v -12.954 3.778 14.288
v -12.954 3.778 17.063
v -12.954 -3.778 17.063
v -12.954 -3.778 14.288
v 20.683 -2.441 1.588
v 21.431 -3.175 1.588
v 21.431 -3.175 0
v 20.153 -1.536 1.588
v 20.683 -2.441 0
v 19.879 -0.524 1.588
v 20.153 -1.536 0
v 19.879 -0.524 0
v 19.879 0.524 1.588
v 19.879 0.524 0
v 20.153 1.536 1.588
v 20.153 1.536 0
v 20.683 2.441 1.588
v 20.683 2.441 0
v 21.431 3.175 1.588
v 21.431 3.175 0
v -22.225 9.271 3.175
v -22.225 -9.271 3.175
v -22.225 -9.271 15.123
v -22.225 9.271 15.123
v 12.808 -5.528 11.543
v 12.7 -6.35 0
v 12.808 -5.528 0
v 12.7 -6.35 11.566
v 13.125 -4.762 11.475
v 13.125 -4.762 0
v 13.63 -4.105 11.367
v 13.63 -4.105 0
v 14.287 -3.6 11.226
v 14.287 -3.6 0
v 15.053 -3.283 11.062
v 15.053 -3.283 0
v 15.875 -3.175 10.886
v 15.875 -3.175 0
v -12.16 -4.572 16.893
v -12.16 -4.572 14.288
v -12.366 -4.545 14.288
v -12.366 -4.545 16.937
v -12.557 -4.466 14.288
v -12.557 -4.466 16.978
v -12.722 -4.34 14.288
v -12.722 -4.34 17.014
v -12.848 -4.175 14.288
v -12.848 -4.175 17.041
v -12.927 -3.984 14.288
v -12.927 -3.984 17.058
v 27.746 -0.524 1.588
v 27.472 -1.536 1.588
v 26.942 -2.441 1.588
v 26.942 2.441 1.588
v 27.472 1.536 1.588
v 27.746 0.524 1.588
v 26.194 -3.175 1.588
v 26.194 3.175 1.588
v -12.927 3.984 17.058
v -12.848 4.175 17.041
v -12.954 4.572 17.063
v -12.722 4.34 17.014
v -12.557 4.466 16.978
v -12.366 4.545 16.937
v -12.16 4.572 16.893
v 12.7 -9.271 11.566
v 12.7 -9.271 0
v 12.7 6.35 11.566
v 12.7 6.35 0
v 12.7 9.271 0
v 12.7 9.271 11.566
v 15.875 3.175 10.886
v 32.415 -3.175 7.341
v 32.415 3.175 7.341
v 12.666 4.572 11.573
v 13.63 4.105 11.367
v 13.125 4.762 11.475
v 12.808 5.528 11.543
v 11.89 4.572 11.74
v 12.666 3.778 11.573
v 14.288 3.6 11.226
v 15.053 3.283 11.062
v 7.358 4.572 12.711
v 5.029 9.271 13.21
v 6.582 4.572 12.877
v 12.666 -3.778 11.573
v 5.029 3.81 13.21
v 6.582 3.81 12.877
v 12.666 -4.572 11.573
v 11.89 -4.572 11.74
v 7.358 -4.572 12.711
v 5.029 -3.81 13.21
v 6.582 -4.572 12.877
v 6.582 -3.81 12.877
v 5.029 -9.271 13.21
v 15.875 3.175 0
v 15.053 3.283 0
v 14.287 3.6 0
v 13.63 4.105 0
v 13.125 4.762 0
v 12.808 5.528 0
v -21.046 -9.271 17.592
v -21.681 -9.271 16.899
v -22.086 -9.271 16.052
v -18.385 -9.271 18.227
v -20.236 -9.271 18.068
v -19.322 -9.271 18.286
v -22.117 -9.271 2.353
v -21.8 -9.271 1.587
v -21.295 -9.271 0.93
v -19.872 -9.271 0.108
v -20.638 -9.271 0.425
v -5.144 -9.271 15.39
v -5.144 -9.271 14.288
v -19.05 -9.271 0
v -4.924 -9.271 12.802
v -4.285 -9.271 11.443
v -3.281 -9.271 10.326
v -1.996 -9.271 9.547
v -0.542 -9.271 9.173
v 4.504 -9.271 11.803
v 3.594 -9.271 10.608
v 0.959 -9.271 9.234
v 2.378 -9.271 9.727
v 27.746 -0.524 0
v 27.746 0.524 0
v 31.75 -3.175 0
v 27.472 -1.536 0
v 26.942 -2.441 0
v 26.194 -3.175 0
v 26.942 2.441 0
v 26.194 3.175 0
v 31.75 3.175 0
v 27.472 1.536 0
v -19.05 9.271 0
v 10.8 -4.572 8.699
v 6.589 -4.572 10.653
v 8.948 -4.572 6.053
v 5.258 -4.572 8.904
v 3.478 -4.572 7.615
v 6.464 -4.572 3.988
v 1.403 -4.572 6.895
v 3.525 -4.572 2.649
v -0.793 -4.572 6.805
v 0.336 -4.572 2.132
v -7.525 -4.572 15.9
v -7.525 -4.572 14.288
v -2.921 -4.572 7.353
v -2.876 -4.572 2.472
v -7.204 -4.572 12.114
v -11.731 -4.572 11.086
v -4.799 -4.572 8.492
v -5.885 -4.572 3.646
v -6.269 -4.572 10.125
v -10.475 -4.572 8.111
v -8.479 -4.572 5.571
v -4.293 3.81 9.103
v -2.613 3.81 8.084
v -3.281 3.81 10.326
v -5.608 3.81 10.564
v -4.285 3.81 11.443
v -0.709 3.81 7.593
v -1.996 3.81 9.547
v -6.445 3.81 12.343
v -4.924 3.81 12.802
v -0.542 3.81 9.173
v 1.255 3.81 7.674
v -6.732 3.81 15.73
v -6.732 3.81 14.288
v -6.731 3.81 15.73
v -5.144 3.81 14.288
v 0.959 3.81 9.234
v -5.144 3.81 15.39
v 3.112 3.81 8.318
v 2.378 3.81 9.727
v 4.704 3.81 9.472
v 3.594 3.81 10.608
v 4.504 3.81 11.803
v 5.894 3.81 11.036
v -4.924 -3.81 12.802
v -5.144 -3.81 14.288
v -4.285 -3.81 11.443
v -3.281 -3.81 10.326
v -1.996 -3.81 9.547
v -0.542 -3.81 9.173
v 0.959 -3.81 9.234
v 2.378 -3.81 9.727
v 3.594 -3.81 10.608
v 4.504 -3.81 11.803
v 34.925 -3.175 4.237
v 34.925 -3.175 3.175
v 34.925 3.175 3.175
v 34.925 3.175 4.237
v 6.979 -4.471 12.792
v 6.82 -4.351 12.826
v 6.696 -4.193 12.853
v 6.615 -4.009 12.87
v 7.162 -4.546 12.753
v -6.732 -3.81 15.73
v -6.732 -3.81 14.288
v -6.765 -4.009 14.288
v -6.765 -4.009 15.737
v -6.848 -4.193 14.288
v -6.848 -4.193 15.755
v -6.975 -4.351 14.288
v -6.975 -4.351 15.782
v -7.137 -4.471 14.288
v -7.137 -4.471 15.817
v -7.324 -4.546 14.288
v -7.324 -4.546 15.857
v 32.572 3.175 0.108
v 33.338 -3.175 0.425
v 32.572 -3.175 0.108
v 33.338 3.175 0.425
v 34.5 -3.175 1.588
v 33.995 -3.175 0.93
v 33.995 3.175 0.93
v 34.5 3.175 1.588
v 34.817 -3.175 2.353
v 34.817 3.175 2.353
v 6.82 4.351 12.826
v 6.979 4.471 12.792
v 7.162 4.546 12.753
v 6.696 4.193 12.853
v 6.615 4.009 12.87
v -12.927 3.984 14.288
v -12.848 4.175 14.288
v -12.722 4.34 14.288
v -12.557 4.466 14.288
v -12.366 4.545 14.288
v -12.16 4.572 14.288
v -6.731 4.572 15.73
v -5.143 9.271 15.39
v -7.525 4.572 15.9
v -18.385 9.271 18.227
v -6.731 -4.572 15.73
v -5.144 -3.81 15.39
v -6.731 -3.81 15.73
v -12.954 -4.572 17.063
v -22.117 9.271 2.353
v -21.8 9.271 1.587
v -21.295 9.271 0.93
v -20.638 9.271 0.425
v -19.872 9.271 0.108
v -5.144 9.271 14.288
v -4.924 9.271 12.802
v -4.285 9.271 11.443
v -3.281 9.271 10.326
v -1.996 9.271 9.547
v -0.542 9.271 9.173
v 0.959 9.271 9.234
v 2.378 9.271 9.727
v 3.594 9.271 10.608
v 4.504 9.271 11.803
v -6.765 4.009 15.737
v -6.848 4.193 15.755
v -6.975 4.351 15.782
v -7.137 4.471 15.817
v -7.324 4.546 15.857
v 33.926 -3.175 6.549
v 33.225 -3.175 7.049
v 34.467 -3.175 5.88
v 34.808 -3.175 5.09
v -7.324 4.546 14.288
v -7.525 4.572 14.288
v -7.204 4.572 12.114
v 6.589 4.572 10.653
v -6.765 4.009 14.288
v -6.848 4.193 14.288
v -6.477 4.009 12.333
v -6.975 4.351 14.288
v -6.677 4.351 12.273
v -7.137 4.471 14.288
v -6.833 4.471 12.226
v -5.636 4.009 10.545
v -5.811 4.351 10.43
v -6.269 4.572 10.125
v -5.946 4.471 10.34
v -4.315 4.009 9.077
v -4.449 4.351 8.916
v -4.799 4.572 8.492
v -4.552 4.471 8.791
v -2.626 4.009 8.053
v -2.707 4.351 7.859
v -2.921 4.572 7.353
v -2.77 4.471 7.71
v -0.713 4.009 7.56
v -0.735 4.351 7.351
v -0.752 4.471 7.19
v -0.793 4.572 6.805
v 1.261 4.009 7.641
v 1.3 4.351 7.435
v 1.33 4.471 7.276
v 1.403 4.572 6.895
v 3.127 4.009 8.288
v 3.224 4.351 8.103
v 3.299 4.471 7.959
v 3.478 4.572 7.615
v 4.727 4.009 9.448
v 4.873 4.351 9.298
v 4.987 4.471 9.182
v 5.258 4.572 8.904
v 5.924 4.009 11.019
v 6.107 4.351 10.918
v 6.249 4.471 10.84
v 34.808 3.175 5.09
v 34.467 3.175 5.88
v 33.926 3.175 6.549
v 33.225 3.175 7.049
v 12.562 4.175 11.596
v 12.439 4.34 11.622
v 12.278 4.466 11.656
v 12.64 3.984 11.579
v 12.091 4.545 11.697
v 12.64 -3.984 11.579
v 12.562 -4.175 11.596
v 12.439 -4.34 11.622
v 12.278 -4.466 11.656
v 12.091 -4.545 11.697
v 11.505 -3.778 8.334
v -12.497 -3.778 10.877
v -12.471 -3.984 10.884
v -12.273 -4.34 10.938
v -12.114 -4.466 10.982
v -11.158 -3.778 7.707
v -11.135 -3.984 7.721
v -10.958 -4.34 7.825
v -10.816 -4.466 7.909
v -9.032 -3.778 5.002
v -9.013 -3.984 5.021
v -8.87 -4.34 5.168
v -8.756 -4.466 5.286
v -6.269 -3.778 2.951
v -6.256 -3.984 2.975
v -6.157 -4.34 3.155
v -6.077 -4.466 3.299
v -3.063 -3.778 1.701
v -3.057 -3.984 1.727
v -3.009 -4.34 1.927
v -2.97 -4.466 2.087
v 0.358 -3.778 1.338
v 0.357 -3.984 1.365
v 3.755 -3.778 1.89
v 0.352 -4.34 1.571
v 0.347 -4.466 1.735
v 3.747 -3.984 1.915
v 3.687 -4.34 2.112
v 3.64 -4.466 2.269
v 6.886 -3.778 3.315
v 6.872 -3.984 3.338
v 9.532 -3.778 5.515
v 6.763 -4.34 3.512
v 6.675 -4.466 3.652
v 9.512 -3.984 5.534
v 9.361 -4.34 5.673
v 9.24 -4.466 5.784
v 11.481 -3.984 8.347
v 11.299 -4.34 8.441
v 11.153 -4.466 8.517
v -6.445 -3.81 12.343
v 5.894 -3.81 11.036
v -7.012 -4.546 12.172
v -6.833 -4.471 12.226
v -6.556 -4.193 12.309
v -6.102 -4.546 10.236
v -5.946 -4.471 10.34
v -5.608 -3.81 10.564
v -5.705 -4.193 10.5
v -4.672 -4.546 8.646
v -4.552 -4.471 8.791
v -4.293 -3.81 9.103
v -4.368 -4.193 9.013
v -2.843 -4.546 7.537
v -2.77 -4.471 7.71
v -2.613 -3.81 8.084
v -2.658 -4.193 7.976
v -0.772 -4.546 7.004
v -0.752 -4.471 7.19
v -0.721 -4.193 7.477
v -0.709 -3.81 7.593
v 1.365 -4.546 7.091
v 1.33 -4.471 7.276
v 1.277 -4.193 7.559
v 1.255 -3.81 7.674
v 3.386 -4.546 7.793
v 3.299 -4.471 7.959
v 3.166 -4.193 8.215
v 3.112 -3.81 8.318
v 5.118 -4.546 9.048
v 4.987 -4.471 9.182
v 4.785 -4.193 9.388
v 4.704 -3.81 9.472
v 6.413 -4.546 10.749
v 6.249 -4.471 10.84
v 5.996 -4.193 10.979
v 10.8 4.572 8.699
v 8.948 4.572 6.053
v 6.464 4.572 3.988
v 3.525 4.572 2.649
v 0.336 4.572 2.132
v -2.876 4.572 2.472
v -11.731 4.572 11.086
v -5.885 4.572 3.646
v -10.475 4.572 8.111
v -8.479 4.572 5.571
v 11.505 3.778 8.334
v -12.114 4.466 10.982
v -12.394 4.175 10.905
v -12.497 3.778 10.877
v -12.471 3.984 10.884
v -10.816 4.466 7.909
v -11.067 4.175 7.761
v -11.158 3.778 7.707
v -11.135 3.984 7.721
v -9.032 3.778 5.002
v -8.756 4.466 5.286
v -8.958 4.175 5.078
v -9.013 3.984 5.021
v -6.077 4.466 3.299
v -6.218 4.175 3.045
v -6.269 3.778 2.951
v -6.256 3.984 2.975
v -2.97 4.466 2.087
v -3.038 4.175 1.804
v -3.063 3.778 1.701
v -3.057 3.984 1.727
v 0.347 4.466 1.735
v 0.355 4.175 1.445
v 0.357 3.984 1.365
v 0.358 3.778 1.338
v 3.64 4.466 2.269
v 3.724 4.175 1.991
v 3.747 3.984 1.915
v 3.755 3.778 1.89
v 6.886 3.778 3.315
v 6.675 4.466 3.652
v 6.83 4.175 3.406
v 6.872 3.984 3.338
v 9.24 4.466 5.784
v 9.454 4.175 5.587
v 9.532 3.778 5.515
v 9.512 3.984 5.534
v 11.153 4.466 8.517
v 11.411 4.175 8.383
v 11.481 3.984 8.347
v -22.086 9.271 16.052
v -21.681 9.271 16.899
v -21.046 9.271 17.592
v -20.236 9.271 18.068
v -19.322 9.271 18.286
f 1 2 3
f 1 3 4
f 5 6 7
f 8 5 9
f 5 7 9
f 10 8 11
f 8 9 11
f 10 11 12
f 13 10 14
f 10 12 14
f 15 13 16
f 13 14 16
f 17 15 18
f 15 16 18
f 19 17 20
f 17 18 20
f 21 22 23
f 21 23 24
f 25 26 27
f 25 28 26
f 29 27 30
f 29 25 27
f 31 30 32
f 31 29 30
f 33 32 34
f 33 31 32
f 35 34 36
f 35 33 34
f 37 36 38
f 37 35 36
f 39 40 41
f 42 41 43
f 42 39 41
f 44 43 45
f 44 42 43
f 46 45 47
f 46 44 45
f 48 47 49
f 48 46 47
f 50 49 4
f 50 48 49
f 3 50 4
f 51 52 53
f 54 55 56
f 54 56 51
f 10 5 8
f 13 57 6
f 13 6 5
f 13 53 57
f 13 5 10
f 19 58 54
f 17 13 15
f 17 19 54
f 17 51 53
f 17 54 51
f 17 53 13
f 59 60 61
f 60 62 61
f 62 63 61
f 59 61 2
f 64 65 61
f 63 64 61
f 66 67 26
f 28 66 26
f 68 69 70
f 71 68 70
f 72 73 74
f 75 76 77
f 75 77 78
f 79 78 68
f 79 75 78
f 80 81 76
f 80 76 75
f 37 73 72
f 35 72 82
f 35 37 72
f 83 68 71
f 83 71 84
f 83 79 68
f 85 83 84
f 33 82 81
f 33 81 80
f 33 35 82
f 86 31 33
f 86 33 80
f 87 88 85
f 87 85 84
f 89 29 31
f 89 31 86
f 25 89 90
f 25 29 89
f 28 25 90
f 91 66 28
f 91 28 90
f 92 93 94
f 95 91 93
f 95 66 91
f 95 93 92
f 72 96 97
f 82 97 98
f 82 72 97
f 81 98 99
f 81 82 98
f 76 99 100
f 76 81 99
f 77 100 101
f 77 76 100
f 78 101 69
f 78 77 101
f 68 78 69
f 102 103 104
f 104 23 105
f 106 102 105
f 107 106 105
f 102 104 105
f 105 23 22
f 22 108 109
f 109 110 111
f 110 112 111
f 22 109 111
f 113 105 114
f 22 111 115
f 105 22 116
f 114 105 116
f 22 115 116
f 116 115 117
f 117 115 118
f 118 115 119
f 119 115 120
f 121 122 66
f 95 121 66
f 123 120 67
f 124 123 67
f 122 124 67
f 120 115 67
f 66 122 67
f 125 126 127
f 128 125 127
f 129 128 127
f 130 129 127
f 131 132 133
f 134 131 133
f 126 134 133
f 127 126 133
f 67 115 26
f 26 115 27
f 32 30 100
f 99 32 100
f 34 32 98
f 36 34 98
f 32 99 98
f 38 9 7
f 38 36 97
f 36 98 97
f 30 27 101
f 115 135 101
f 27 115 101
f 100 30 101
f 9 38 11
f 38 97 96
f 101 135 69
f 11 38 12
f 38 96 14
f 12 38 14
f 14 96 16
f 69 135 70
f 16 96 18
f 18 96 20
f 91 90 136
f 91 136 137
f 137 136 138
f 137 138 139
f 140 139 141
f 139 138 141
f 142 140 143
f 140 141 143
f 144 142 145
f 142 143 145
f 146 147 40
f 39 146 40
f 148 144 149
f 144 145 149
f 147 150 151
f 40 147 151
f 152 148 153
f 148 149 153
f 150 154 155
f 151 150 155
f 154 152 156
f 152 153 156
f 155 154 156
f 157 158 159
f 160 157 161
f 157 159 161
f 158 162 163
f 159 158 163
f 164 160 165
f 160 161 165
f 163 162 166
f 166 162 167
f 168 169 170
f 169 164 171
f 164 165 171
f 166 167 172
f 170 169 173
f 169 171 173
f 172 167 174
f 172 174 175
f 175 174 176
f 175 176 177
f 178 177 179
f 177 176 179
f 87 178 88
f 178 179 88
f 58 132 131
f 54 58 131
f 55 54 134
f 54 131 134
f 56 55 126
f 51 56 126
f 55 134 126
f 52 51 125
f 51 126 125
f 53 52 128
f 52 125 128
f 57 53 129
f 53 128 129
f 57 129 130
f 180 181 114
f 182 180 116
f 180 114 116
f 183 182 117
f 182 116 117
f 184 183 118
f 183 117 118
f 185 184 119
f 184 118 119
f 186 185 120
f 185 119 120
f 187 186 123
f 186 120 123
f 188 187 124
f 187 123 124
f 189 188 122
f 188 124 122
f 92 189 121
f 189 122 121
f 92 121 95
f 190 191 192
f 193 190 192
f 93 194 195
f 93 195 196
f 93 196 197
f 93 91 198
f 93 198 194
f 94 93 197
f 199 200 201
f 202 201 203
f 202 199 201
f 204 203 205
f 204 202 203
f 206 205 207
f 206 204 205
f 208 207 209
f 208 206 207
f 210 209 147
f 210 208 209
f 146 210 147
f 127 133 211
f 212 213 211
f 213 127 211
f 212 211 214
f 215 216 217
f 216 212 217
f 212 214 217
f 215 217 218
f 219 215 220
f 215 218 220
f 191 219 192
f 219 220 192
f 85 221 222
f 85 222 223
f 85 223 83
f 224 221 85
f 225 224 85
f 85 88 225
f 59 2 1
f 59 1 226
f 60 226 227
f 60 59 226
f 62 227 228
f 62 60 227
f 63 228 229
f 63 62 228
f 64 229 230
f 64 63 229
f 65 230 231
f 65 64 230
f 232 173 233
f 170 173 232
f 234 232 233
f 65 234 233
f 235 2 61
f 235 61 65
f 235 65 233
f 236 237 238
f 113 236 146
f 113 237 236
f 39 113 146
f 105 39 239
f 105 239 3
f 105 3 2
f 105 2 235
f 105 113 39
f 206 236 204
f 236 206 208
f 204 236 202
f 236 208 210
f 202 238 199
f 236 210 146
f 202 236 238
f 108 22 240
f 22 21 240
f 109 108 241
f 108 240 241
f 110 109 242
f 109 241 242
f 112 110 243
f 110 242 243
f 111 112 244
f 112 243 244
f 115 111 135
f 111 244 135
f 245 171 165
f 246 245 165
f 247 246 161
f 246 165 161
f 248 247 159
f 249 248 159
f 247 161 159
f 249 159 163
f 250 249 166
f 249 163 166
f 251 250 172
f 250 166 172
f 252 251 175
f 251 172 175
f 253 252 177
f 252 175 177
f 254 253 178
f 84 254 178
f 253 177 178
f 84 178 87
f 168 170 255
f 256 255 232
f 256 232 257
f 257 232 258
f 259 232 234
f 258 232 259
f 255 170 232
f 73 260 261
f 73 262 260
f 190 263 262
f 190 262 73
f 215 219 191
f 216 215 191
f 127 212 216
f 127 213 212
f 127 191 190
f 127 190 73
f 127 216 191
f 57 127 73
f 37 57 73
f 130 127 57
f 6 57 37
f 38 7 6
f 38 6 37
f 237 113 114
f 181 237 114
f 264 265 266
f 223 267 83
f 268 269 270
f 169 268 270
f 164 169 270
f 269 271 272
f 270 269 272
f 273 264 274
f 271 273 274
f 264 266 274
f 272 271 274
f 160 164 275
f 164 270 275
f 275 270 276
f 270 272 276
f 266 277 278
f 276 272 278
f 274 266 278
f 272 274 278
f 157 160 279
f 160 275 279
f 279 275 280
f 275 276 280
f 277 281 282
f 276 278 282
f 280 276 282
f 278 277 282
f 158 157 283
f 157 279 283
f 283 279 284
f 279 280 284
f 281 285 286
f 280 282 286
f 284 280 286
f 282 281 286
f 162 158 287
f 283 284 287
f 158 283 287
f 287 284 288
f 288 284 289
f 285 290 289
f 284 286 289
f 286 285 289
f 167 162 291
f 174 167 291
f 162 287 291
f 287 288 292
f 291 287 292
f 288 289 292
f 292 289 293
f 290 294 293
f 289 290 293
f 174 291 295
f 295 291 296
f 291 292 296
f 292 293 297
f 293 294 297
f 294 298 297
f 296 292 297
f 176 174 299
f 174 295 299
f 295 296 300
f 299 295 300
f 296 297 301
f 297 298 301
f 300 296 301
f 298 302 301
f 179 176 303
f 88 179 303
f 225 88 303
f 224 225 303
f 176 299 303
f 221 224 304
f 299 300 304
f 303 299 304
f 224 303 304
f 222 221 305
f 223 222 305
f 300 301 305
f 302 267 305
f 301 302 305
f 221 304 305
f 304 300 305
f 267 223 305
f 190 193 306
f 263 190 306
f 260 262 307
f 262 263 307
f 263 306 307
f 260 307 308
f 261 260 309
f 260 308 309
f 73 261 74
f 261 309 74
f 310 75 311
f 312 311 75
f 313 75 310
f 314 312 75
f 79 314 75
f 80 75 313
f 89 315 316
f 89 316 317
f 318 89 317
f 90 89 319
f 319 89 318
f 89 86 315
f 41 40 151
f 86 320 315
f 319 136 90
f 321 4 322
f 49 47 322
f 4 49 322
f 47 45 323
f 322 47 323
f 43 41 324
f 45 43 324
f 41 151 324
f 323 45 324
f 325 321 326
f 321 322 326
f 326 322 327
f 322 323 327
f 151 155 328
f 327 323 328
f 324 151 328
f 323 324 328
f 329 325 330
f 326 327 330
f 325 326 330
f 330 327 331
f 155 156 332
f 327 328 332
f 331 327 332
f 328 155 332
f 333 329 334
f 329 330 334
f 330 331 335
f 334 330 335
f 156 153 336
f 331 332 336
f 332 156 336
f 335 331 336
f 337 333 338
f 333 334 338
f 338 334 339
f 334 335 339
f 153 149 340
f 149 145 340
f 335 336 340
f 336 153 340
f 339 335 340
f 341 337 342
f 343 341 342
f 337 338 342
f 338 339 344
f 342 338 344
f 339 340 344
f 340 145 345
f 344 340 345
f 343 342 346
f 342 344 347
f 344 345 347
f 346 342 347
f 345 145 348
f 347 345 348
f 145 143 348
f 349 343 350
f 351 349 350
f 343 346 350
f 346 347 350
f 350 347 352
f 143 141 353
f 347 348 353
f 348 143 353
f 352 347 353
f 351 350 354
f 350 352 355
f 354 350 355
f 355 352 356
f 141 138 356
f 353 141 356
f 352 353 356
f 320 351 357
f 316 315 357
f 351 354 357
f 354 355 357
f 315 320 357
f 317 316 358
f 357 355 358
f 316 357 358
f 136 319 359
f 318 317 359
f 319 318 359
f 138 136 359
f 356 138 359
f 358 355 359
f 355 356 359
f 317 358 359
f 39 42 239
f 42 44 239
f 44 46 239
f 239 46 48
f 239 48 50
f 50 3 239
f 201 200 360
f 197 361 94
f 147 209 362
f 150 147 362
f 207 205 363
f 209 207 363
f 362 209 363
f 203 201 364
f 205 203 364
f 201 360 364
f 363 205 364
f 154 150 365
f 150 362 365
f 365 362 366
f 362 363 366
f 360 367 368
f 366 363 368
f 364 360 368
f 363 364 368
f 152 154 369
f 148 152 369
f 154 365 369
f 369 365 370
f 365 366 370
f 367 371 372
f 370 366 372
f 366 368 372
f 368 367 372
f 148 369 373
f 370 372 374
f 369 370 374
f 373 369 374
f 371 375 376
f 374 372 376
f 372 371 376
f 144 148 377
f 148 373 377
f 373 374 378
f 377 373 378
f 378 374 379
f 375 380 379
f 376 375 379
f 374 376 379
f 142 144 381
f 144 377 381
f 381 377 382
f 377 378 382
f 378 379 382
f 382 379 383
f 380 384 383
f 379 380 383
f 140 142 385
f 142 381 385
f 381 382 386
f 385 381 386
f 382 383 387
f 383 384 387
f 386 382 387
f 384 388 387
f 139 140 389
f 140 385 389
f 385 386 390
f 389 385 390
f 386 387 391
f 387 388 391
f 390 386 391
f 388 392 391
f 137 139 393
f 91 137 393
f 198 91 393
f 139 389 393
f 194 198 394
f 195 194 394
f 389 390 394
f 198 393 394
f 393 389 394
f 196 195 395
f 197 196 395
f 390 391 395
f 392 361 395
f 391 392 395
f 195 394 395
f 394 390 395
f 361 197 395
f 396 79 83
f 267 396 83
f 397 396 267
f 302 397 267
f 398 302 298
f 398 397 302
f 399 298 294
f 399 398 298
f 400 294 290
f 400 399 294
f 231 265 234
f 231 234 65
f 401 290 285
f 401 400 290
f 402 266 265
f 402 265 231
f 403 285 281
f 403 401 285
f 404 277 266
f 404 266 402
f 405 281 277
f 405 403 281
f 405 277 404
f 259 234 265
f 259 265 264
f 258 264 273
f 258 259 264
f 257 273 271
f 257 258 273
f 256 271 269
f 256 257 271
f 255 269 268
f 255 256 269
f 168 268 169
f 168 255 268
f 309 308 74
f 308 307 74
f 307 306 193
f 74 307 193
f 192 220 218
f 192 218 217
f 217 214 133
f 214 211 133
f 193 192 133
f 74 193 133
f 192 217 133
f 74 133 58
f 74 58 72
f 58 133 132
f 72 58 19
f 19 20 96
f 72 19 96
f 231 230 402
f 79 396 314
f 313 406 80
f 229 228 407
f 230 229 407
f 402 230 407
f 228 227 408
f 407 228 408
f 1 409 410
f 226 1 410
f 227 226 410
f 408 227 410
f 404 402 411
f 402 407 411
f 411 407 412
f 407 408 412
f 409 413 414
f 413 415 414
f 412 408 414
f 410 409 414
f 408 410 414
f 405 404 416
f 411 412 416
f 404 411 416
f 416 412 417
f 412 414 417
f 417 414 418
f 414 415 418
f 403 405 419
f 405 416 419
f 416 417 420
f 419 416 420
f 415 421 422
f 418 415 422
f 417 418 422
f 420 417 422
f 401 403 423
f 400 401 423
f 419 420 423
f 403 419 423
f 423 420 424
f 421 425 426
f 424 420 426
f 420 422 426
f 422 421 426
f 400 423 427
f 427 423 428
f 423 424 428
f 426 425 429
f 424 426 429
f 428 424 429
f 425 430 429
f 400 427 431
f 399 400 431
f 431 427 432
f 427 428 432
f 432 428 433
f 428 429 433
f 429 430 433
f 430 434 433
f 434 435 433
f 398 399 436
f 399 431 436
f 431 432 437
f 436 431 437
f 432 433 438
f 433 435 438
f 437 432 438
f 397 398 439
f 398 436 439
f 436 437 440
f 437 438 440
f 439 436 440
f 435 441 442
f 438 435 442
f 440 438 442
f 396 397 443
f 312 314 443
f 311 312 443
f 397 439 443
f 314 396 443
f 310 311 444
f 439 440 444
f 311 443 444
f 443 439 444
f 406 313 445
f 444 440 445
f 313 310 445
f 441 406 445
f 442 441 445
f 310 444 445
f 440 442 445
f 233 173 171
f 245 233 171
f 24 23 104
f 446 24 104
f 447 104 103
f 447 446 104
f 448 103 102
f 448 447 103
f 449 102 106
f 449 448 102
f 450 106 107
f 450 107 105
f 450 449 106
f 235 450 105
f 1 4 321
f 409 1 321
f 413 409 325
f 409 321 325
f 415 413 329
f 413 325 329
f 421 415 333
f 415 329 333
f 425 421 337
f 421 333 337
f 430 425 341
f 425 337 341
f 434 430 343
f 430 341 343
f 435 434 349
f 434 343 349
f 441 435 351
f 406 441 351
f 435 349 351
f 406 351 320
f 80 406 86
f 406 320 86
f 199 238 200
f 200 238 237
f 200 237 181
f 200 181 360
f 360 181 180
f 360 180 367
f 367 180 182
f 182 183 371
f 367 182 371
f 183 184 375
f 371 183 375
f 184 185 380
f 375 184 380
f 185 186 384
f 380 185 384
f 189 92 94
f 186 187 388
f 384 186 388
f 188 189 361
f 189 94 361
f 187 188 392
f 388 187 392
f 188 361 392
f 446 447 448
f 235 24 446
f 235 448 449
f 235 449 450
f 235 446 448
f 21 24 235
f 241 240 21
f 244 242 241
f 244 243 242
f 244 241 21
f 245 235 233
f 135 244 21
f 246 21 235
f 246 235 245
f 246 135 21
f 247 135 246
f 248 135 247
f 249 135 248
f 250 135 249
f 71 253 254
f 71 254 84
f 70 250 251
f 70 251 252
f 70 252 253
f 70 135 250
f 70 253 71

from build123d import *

# Parameters (mm, degrees)
SKETCH1_W               = 57.15
SKETCH1_H               = 18.542
BOSS_EXTRUDE1_DEPTH     = 19.05
CUT_EXTRUDE1_DEPTH      = 41.848617676
CUT_EXTRUDE1_DEPTH_BACK = 41.848617676
CUT_EXTRUDE2_DEPTH      = 4.572
CUT_EXTRUDE2_DEPTH_BACK = 4.572
CUT_EXTRUDE3_DEPTH      = 3.81
CUT_EXTRUDE3_DEPTH_BACK = 3.81
CUT_EXTRUDE5_DEPTH      = 44.89150133
FILLET1_R               = 3.175
SKETCH9_R               = 3.96875
CUT_EXTRUDE6_DEPTH      = 1.5875
SKETCH10_W              = 22.225
SKETCH10_H              = 6.096
CUT_EXTRUDE7_DEPTH      = 41.503184716
FILLET2_R               = 3.175
FILLET3_R               = 0.79375


with BuildPart() as part:
    # Sketch1 → Boss-Extrude1 (new body)
    with BuildSketch(Plane.XY):
        with Locations((6.35, 0)):
            Rectangle(SKETCH1_W, SKETCH1_H)
    extrude(amount=BOSS_EXTRUDE1_DEPTH)

    # Sketch3 → Cut-Extrude1 (cut, two sides: drawn at the far end of the back side and taken through both)
    with BuildSketch(Plane(origin=(0, 0, 0), x_dir=(1, 0, 0), z_dir=(0, 1, 0)).offset(-CUT_EXTRUDE1_DEPTH_BACK)):
        with BuildLine():
            Line((-5.1435, -19.05), (-5.1435, -14.2875))
            ThreePointArc((-5.1435, -14.2875), (0, -9.144), (5.1435, -14.2875))
            Line((5.1435, -14.2875), (5.1435, -19.05))
            ThreePointArc((5.1435, -19.05), (0, -24.1935), (-5.1435, -19.05))
        make_face()
    extrude(amount=CUT_EXTRUDE1_DEPTH + CUT_EXTRUDE1_DEPTH_BACK, mode=Mode.SUBTRACT)

    # Sketch5 → Cut-Extrude2 (cut, two sides: drawn at the far end of the back side and taken through both)
    with BuildSketch(Plane(origin=(0, 0, 0), x_dir=(1, 0, 0), z_dir=(0, 1, 0)).offset(-CUT_EXTRUDE2_DEPTH_BACK)):
        with BuildLine():
            Line((12.954, -14.2875), (12.954, -19.05))
            ThreePointArc((12.954, -19.05), (0, -32.004), (-12.954, -19.05))
            Line((-12.954, -19.05), (-12.954, -14.2875))
            ThreePointArc((-12.954, -14.2875), (0, -1.3335), (12.954, -14.2875))
        make_face()
        with BuildLine():
            Line((-6.731, -19.05), (-6.731, -14.2875))
            ThreePointArc((-6.731, -14.2875), (0, -7.5565), (6.731, -14.2875))
            Line((6.731, -14.2875), (6.731, -19.05))
            ThreePointArc((6.731, -19.05), (0, -25.781), (-6.731, -19.05))
        make_face(mode=Mode.SUBTRACT)
    extrude(amount=CUT_EXTRUDE2_DEPTH + CUT_EXTRUDE2_DEPTH_BACK, mode=Mode.SUBTRACT)

    # Sketch6 → Cut-Extrude3 (cut, two sides: drawn at the far end of the back side and taken through both)
    with BuildSketch(Plane(origin=(0, 0, 0), x_dir=(1, 0, 0), z_dir=(0, 1, 0)).offset(-CUT_EXTRUDE3_DEPTH_BACK)):
        with BuildLine():
            Line((-8.3185, -19.05), (-8.3185, -14.2875))
            ThreePointArc((-8.3185, -14.2875), (0, -5.969), (8.3185, -14.2875))
            Line((8.3185, -14.2875), (8.3185, -19.05))
            ThreePointArc((8.3185, -19.05), (0, -27.3685), (-8.3185, -19.05))
        make_face()
    extrude(amount=CUT_EXTRUDE3_DEPTH + CUT_EXTRUDE3_DEPTH_BACK, mode=Mode.SUBTRACT)

    # Sketch8 → Cut-Extrude5 (cut, through all)
    with BuildSketch(Plane.XZ.offset(9.271)):
        Polygon((-22.225, 19.05), (34.925, 19.05), (34.925, 6.803571429), align=None)
    extrude(amount=-CUT_EXTRUDE5_DEPTH, mode=Mode.SUBTRACT)

    # Fillet1
    fillet1_edges = [part.edges().sort_by_distance(p)[0] for p in [
        (-22.225, 0, 19.05),
        (34.925, 0, 6.803571429),
        (-22.225, 0, 0),
        (34.925, 0, 0),
    ]]
    fillet(fillet1_edges, radius=FILLET1_R)

    # Sketch9 → Cut-Extrude6 (cut)
    with BuildSketch(Plane(origin=(0, 0, 0), x_dir=(-1, 0, 0), z_dir=(0, 0, -1))):
        with Locations((-23.8125, 0)):
            Circle(SKETCH9_R)
    extrude(amount=-CUT_EXTRUDE6_DEPTH, mode=Mode.SUBTRACT)

    # Sketch10 → Cut-Extrude7 (cut, through all)
    with BuildSketch(Plane(origin=(0, 0, 0), x_dir=(-1, 0, 0), z_dir=(0, 0, -1))):
        with Locations((-23.8125, 6.223)):
            Rectangle(SKETCH10_W, SKETCH10_H)
        with Locations((-23.8125, -6.223)):
            Rectangle(SKETCH10_W, SKETCH10_H)
    extrude(amount=-CUT_EXTRUDE7_DEPTH, mode=Mode.SUBTRACT)

    # Fillet2
    fillet2_edges = [part.edges().sort_by_distance(p)[0] for p in [
        (12.7, 3.175, 5.783035714),
        (12.7, -3.175, 5.783035714),
    ]]
    fillet(fillet2_edges, radius=FILLET2_R)

    # Fillet3
    # the kernel refuses this fillet: 0.79375 mm, written as the material it adds along each edge
    with BuildSketch(Plane(origin=(-6.731, 4.572, 17.714232143), x_dir=(-1, 0, 0), z_dir=(0, 0, -1))) as fillet3_piece_1_section:
        with BuildLine():
            CenterArc((FILLET3_R, -FILLET3_R), FILLET3_R, 90, 90)
            Line((0, -FILLET3_R), (0, 0))
            Line((0, 0), (FILLET3_R, 0))
        make_face()
    fillet3_piece_1 = extrude(amount=3.426732143, mode=Mode.PRIVATE)
    fillet3_piece_1 = split(fillet3_piece_1, bisect_by=Plane(origin=(-6.763728877, 4.396665284, 15.736870474), z_dir=(-0.2095290887308735, 0, -0.9778024140774095)), keep=Keep.TOP, mode=Mode.PRIVATE)
    fillet3_piece_1 = split(fillet3_piece_1, bisect_by=Plane(origin=(-6.915533266, 3.81, 15.028449993), z_dir=(0, 1, 0)), keep=Keep.TOP, mode=Mode.PRIVATE)
    add(fillet3_piece_1)
    with BuildSketch(Plane(origin=(-6.731, -4.572, 17.714232143), x_dir=(-1, 0, 0), z_dir=(0, 0, -1))) as fillet3_piece_2_section:
        with BuildLine():
            CenterArc((FILLET3_R, FILLET3_R), FILLET3_R, 180, 90)
            Line((0, FILLET3_R), (0, 0))
            Line((0, 0), (FILLET3_R, 0))
        make_face()
    fillet3_piece_2 = extrude(amount=3.426732143, mode=Mode.PRIVATE)
    fillet3_piece_2 = split(fillet3_piece_2, bisect_by=Plane(origin=(-6.763728877, -4.396665284, 15.736870474), z_dir=(-0.2095290887308735, 0, -0.9778024140774095)), keep=Keep.TOP, mode=Mode.PRIVATE)
    fillet3_piece_2 = split(fillet3_piece_2, bisect_by=Plane(origin=(-6.915533266, -3.81, 15.028449993), z_dir=(0, -1, 0)), keep=Keep.TOP, mode=Mode.PRIVATE)
    add(fillet3_piece_2)
    with BuildSketch(Plane(origin=(-12.954, -4.572, 19.047732143), x_dir=(1, 0, 0), z_dir=(0, 0, -1))) as fillet3_piece_3_section:
        with BuildLine():
            CenterArc((FILLET3_R, -FILLET3_R), FILLET3_R, 90, 90)
            Line((0, -FILLET3_R), (0, 0))
            Line((0, 0), (FILLET3_R, 0))
        make_face()
    fillet3_piece_3 = extrude(amount=4.760232143, mode=Mode.PRIVATE)
    fillet3_piece_3 = split(fillet3_piece_3, bisect_by=Plane(origin=(-12.496129388, -4.39094469, 16.965242012), z_dir=(-0.2095290887308735, 0, -0.9778024140774095)), keep=Keep.TOP, mode=Mode.PRIVATE)
    add(fillet3_piece_3)
    with BuildSketch(Plane(origin=(-12.954, 4.572, 19.047732143), x_dir=(1, 0, 0), z_dir=(0, 0, -1))) as fillet3_piece_4_section:
        with BuildLine():
            CenterArc((FILLET3_R, FILLET3_R), FILLET3_R, 180, 90)
            Line((0, FILLET3_R), (0, 0))
            Line((0, 0), (FILLET3_R, 0))
        make_face()
    fillet3_piece_4 = extrude(amount=4.760232143, mode=Mode.PRIVATE)
    fillet3_piece_4 = split(fillet3_piece_4, bisect_by=Plane(origin=(-12.496129388, 4.39094469, 16.965242012), z_dir=(-0.2095290887308735, 0, -0.9778024140774095)), keep=Keep.TOP, mode=Mode.PRIVATE)
    add(fillet3_piece_4)
    with BuildSketch(Plane(origin=(0, 4.572, 14.2875), x_dir=(-1, 0, 0), z_dir=(0, 0, 1))) as fillet3_piece_5_section:
        with BuildLine():
            CenterArc((6.731 + FILLET3_R, FILLET3_R), FILLET3_R, 180, 90)
            Line((6.731 + FILLET3_R, 0), (6.731, 0))
            Line((6.731, 0), (6.731, FILLET3_R))
        make_face()
    fillet3_piece_5 = revolve(axis=Axis((0, 4.572, 14.2875), (0, -1, 0)), revolution_arc=167.905242923, mode=Mode.PRIVATE)
    fillet3_piece_5 = split(fillet3_piece_5, bisect_by=Plane(origin=(-0.733722895, 3.81, 7.361688783), z_dir=(0, 1, 0)), keep=Keep.TOP, mode=Mode.PRIVATE)
    add(fillet3_piece_5)
    with BuildSketch(Plane(origin=(0, -4.572, 14.2875), x_dir=(-1, 0, 0), z_dir=(0, 0, 1))) as fillet3_piece_6_section:
        with BuildLine():
            CenterArc((6.731 + FILLET3_R, -FILLET3_R), FILLET3_R, 90, 90)
            Line((6.731, -FILLET3_R), (6.731, 0))
            Line((6.731, 0), (6.731 + FILLET3_R, 0))
        make_face()
    fillet3_piece_6 = revolve(axis=Axis((0, -4.572, 14.2875), (0, -1, 0)), revolution_arc=167.905242923, mode=Mode.PRIVATE)
    fillet3_piece_6 = split(fillet3_piece_6, bisect_by=Plane(origin=(-0.733722895, -3.81, 7.361688783), z_dir=(0, -1, 0)), keep=Keep.TOP, mode=Mode.PRIVATE)
    add(fillet3_piece_6)
    with BuildSketch(Plane(origin=(0, -4.572, 14.2875), x_dir=(-1, 0, 0), z_dir=(0, 0, 1))) as fillet3_piece_7:
        with BuildLine():
            CenterArc((12.954 - FILLET3_R, -FILLET3_R), FILLET3_R, 0, 90)
            Line((12.954 - FILLET3_R, 0), (12.954, 0))
            Line((12.954, 0), (12.954, -FILLET3_R))
        make_face()
    revolve(axis=Axis((0, -4.572, 14.2875), (0, -1, 0)), revolution_arc=167.905242923)
    with BuildSketch(Plane(origin=(0, 4.572, 14.2875), x_dir=(-1, 0, 0), z_dir=(0, 0, 1))) as fillet3_piece_8:
        with BuildLine():
            CenterArc((12.954 - FILLET3_R, FILLET3_R), FILLET3_R, 270, 90)
            Line((12.954, FILLET3_R), (12.954, 0))
            Line((12.954, 0), (12.954 - FILLET3_R, 0))
        make_face()
    revolve(axis=Axis((0, 4.572, 14.2875), (0, -1, 0)), revolution_arc=167.905242923)


solid = part.part
